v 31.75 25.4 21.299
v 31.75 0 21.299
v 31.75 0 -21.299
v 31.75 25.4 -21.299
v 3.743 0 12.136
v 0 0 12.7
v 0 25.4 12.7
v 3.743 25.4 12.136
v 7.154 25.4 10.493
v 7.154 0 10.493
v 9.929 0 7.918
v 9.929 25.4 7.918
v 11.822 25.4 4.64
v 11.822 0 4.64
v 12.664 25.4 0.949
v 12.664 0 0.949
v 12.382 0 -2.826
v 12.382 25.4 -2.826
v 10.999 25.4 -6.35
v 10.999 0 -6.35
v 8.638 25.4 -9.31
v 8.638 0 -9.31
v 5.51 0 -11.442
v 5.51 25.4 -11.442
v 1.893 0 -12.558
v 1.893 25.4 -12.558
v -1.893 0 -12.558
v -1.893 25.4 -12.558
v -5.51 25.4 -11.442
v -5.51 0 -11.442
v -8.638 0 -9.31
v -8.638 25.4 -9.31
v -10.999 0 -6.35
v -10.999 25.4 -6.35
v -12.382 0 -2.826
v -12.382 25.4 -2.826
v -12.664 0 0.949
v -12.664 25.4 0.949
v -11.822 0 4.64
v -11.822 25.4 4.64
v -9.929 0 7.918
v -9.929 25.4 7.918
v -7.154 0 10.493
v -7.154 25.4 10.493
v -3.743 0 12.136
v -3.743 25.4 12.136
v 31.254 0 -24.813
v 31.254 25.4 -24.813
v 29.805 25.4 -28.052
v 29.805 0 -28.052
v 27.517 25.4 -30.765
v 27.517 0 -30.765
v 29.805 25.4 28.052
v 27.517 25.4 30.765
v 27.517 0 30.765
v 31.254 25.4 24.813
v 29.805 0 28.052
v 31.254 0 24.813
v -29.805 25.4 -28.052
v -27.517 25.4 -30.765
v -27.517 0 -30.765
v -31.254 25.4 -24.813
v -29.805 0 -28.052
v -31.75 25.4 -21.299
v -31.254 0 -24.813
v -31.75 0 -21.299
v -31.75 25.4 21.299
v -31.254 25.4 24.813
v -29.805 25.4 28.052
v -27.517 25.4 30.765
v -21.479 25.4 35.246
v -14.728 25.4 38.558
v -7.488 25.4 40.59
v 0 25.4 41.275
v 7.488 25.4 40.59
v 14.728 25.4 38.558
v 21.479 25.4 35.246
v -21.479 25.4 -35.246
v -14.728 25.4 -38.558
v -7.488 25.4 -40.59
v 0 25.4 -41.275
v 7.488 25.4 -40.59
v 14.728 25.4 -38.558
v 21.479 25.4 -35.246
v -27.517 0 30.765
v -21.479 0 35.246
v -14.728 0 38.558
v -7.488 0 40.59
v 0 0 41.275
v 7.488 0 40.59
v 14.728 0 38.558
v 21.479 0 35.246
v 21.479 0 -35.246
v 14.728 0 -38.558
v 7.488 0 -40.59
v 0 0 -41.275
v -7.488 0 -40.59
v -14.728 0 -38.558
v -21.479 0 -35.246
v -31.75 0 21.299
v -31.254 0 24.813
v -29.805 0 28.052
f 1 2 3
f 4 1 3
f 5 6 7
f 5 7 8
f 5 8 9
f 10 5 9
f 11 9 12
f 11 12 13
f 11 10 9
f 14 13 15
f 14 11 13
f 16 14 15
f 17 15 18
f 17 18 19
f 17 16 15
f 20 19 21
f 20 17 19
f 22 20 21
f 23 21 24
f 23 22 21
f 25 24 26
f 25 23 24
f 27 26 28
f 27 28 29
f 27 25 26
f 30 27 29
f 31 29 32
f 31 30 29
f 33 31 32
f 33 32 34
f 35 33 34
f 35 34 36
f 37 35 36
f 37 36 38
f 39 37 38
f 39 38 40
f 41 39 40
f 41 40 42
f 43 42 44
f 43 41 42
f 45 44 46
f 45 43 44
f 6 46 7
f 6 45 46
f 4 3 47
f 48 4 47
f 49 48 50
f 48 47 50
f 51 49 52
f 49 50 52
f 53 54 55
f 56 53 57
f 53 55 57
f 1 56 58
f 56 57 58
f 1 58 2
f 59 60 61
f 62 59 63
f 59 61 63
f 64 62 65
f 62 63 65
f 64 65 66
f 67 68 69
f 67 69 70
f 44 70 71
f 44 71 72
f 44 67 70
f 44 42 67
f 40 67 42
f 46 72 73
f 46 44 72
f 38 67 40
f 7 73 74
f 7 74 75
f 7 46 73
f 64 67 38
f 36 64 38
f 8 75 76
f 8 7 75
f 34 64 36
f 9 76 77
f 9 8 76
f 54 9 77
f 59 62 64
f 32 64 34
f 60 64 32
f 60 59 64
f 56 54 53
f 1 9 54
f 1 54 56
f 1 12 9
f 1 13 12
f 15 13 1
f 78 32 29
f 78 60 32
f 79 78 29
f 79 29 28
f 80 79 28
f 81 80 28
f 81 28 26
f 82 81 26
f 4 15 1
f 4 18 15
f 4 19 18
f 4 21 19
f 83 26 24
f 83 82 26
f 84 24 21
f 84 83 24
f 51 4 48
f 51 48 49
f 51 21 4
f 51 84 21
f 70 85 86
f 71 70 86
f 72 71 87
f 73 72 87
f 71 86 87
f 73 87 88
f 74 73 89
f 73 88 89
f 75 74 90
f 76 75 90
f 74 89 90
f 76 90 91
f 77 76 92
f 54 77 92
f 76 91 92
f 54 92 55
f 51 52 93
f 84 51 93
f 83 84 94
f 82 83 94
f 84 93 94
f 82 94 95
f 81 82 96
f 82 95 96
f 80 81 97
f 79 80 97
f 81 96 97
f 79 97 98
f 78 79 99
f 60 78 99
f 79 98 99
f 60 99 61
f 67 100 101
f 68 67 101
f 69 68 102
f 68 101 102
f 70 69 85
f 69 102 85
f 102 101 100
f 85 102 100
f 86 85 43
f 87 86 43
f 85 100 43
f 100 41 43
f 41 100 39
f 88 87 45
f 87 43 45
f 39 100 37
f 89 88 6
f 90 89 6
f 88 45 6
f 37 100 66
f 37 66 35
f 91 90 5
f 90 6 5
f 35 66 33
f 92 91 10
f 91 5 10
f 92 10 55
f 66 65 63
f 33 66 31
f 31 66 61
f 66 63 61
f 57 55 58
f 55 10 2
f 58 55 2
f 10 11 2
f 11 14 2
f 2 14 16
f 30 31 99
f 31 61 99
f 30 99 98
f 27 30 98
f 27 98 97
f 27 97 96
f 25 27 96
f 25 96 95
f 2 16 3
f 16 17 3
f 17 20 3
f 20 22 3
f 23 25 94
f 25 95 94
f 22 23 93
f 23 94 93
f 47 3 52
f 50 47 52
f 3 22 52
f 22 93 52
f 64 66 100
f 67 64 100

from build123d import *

# Parameters (mm, degrees)
SKETCH1_R      = 12.7
EXTRUDE2_DEPTH = 25.4


with BuildPart() as part:
    # Sketch1 → Extrude2 (new body)
    with BuildSketch(Plane(origin=(0, 0, 0), x_dir=(1, 0, 0), z_dir=(0, 1, 0))):
        with BuildLine():
            Line((-31.75, 21.298547486), (-31.75, -21.298547486))
            ThreePointArc((-31.75, -21.298547486), (-30.643460801, -26.483300775), (-27.516666667, -30.76456859))
            ThreePointArc((-27.516666667, -30.76456859), (0, -41.275), (27.516666667, -30.76456859))
            ThreePointArc((27.516666667, -30.76456859), (30.643460801, -26.483300775), (31.75, -21.298547486))
            Line((31.75, -21.298547486), (31.75, 21.298547486))
            ThreePointArc((31.75, 21.298547486), (30.643460801, 26.483300775), (27.516666667, 30.76456859))
            ThreePointArc((27.516666667, 30.76456859), (0, 41.275), (-27.516666667, 30.76456859))
            ThreePointArc((-27.516666667, 30.76456859), (-30.643460801, 26.483300775), (-31.75, 21.298547486))
        make_face()
        with Locations(Location((0, 0, 0), (0, 0, 270))):
            Circle(SKETCH1_R, mode=Mode.SUBTRACT)
    extrude(amount=EXTRUDE2_DEPTH)


solid = part.part
